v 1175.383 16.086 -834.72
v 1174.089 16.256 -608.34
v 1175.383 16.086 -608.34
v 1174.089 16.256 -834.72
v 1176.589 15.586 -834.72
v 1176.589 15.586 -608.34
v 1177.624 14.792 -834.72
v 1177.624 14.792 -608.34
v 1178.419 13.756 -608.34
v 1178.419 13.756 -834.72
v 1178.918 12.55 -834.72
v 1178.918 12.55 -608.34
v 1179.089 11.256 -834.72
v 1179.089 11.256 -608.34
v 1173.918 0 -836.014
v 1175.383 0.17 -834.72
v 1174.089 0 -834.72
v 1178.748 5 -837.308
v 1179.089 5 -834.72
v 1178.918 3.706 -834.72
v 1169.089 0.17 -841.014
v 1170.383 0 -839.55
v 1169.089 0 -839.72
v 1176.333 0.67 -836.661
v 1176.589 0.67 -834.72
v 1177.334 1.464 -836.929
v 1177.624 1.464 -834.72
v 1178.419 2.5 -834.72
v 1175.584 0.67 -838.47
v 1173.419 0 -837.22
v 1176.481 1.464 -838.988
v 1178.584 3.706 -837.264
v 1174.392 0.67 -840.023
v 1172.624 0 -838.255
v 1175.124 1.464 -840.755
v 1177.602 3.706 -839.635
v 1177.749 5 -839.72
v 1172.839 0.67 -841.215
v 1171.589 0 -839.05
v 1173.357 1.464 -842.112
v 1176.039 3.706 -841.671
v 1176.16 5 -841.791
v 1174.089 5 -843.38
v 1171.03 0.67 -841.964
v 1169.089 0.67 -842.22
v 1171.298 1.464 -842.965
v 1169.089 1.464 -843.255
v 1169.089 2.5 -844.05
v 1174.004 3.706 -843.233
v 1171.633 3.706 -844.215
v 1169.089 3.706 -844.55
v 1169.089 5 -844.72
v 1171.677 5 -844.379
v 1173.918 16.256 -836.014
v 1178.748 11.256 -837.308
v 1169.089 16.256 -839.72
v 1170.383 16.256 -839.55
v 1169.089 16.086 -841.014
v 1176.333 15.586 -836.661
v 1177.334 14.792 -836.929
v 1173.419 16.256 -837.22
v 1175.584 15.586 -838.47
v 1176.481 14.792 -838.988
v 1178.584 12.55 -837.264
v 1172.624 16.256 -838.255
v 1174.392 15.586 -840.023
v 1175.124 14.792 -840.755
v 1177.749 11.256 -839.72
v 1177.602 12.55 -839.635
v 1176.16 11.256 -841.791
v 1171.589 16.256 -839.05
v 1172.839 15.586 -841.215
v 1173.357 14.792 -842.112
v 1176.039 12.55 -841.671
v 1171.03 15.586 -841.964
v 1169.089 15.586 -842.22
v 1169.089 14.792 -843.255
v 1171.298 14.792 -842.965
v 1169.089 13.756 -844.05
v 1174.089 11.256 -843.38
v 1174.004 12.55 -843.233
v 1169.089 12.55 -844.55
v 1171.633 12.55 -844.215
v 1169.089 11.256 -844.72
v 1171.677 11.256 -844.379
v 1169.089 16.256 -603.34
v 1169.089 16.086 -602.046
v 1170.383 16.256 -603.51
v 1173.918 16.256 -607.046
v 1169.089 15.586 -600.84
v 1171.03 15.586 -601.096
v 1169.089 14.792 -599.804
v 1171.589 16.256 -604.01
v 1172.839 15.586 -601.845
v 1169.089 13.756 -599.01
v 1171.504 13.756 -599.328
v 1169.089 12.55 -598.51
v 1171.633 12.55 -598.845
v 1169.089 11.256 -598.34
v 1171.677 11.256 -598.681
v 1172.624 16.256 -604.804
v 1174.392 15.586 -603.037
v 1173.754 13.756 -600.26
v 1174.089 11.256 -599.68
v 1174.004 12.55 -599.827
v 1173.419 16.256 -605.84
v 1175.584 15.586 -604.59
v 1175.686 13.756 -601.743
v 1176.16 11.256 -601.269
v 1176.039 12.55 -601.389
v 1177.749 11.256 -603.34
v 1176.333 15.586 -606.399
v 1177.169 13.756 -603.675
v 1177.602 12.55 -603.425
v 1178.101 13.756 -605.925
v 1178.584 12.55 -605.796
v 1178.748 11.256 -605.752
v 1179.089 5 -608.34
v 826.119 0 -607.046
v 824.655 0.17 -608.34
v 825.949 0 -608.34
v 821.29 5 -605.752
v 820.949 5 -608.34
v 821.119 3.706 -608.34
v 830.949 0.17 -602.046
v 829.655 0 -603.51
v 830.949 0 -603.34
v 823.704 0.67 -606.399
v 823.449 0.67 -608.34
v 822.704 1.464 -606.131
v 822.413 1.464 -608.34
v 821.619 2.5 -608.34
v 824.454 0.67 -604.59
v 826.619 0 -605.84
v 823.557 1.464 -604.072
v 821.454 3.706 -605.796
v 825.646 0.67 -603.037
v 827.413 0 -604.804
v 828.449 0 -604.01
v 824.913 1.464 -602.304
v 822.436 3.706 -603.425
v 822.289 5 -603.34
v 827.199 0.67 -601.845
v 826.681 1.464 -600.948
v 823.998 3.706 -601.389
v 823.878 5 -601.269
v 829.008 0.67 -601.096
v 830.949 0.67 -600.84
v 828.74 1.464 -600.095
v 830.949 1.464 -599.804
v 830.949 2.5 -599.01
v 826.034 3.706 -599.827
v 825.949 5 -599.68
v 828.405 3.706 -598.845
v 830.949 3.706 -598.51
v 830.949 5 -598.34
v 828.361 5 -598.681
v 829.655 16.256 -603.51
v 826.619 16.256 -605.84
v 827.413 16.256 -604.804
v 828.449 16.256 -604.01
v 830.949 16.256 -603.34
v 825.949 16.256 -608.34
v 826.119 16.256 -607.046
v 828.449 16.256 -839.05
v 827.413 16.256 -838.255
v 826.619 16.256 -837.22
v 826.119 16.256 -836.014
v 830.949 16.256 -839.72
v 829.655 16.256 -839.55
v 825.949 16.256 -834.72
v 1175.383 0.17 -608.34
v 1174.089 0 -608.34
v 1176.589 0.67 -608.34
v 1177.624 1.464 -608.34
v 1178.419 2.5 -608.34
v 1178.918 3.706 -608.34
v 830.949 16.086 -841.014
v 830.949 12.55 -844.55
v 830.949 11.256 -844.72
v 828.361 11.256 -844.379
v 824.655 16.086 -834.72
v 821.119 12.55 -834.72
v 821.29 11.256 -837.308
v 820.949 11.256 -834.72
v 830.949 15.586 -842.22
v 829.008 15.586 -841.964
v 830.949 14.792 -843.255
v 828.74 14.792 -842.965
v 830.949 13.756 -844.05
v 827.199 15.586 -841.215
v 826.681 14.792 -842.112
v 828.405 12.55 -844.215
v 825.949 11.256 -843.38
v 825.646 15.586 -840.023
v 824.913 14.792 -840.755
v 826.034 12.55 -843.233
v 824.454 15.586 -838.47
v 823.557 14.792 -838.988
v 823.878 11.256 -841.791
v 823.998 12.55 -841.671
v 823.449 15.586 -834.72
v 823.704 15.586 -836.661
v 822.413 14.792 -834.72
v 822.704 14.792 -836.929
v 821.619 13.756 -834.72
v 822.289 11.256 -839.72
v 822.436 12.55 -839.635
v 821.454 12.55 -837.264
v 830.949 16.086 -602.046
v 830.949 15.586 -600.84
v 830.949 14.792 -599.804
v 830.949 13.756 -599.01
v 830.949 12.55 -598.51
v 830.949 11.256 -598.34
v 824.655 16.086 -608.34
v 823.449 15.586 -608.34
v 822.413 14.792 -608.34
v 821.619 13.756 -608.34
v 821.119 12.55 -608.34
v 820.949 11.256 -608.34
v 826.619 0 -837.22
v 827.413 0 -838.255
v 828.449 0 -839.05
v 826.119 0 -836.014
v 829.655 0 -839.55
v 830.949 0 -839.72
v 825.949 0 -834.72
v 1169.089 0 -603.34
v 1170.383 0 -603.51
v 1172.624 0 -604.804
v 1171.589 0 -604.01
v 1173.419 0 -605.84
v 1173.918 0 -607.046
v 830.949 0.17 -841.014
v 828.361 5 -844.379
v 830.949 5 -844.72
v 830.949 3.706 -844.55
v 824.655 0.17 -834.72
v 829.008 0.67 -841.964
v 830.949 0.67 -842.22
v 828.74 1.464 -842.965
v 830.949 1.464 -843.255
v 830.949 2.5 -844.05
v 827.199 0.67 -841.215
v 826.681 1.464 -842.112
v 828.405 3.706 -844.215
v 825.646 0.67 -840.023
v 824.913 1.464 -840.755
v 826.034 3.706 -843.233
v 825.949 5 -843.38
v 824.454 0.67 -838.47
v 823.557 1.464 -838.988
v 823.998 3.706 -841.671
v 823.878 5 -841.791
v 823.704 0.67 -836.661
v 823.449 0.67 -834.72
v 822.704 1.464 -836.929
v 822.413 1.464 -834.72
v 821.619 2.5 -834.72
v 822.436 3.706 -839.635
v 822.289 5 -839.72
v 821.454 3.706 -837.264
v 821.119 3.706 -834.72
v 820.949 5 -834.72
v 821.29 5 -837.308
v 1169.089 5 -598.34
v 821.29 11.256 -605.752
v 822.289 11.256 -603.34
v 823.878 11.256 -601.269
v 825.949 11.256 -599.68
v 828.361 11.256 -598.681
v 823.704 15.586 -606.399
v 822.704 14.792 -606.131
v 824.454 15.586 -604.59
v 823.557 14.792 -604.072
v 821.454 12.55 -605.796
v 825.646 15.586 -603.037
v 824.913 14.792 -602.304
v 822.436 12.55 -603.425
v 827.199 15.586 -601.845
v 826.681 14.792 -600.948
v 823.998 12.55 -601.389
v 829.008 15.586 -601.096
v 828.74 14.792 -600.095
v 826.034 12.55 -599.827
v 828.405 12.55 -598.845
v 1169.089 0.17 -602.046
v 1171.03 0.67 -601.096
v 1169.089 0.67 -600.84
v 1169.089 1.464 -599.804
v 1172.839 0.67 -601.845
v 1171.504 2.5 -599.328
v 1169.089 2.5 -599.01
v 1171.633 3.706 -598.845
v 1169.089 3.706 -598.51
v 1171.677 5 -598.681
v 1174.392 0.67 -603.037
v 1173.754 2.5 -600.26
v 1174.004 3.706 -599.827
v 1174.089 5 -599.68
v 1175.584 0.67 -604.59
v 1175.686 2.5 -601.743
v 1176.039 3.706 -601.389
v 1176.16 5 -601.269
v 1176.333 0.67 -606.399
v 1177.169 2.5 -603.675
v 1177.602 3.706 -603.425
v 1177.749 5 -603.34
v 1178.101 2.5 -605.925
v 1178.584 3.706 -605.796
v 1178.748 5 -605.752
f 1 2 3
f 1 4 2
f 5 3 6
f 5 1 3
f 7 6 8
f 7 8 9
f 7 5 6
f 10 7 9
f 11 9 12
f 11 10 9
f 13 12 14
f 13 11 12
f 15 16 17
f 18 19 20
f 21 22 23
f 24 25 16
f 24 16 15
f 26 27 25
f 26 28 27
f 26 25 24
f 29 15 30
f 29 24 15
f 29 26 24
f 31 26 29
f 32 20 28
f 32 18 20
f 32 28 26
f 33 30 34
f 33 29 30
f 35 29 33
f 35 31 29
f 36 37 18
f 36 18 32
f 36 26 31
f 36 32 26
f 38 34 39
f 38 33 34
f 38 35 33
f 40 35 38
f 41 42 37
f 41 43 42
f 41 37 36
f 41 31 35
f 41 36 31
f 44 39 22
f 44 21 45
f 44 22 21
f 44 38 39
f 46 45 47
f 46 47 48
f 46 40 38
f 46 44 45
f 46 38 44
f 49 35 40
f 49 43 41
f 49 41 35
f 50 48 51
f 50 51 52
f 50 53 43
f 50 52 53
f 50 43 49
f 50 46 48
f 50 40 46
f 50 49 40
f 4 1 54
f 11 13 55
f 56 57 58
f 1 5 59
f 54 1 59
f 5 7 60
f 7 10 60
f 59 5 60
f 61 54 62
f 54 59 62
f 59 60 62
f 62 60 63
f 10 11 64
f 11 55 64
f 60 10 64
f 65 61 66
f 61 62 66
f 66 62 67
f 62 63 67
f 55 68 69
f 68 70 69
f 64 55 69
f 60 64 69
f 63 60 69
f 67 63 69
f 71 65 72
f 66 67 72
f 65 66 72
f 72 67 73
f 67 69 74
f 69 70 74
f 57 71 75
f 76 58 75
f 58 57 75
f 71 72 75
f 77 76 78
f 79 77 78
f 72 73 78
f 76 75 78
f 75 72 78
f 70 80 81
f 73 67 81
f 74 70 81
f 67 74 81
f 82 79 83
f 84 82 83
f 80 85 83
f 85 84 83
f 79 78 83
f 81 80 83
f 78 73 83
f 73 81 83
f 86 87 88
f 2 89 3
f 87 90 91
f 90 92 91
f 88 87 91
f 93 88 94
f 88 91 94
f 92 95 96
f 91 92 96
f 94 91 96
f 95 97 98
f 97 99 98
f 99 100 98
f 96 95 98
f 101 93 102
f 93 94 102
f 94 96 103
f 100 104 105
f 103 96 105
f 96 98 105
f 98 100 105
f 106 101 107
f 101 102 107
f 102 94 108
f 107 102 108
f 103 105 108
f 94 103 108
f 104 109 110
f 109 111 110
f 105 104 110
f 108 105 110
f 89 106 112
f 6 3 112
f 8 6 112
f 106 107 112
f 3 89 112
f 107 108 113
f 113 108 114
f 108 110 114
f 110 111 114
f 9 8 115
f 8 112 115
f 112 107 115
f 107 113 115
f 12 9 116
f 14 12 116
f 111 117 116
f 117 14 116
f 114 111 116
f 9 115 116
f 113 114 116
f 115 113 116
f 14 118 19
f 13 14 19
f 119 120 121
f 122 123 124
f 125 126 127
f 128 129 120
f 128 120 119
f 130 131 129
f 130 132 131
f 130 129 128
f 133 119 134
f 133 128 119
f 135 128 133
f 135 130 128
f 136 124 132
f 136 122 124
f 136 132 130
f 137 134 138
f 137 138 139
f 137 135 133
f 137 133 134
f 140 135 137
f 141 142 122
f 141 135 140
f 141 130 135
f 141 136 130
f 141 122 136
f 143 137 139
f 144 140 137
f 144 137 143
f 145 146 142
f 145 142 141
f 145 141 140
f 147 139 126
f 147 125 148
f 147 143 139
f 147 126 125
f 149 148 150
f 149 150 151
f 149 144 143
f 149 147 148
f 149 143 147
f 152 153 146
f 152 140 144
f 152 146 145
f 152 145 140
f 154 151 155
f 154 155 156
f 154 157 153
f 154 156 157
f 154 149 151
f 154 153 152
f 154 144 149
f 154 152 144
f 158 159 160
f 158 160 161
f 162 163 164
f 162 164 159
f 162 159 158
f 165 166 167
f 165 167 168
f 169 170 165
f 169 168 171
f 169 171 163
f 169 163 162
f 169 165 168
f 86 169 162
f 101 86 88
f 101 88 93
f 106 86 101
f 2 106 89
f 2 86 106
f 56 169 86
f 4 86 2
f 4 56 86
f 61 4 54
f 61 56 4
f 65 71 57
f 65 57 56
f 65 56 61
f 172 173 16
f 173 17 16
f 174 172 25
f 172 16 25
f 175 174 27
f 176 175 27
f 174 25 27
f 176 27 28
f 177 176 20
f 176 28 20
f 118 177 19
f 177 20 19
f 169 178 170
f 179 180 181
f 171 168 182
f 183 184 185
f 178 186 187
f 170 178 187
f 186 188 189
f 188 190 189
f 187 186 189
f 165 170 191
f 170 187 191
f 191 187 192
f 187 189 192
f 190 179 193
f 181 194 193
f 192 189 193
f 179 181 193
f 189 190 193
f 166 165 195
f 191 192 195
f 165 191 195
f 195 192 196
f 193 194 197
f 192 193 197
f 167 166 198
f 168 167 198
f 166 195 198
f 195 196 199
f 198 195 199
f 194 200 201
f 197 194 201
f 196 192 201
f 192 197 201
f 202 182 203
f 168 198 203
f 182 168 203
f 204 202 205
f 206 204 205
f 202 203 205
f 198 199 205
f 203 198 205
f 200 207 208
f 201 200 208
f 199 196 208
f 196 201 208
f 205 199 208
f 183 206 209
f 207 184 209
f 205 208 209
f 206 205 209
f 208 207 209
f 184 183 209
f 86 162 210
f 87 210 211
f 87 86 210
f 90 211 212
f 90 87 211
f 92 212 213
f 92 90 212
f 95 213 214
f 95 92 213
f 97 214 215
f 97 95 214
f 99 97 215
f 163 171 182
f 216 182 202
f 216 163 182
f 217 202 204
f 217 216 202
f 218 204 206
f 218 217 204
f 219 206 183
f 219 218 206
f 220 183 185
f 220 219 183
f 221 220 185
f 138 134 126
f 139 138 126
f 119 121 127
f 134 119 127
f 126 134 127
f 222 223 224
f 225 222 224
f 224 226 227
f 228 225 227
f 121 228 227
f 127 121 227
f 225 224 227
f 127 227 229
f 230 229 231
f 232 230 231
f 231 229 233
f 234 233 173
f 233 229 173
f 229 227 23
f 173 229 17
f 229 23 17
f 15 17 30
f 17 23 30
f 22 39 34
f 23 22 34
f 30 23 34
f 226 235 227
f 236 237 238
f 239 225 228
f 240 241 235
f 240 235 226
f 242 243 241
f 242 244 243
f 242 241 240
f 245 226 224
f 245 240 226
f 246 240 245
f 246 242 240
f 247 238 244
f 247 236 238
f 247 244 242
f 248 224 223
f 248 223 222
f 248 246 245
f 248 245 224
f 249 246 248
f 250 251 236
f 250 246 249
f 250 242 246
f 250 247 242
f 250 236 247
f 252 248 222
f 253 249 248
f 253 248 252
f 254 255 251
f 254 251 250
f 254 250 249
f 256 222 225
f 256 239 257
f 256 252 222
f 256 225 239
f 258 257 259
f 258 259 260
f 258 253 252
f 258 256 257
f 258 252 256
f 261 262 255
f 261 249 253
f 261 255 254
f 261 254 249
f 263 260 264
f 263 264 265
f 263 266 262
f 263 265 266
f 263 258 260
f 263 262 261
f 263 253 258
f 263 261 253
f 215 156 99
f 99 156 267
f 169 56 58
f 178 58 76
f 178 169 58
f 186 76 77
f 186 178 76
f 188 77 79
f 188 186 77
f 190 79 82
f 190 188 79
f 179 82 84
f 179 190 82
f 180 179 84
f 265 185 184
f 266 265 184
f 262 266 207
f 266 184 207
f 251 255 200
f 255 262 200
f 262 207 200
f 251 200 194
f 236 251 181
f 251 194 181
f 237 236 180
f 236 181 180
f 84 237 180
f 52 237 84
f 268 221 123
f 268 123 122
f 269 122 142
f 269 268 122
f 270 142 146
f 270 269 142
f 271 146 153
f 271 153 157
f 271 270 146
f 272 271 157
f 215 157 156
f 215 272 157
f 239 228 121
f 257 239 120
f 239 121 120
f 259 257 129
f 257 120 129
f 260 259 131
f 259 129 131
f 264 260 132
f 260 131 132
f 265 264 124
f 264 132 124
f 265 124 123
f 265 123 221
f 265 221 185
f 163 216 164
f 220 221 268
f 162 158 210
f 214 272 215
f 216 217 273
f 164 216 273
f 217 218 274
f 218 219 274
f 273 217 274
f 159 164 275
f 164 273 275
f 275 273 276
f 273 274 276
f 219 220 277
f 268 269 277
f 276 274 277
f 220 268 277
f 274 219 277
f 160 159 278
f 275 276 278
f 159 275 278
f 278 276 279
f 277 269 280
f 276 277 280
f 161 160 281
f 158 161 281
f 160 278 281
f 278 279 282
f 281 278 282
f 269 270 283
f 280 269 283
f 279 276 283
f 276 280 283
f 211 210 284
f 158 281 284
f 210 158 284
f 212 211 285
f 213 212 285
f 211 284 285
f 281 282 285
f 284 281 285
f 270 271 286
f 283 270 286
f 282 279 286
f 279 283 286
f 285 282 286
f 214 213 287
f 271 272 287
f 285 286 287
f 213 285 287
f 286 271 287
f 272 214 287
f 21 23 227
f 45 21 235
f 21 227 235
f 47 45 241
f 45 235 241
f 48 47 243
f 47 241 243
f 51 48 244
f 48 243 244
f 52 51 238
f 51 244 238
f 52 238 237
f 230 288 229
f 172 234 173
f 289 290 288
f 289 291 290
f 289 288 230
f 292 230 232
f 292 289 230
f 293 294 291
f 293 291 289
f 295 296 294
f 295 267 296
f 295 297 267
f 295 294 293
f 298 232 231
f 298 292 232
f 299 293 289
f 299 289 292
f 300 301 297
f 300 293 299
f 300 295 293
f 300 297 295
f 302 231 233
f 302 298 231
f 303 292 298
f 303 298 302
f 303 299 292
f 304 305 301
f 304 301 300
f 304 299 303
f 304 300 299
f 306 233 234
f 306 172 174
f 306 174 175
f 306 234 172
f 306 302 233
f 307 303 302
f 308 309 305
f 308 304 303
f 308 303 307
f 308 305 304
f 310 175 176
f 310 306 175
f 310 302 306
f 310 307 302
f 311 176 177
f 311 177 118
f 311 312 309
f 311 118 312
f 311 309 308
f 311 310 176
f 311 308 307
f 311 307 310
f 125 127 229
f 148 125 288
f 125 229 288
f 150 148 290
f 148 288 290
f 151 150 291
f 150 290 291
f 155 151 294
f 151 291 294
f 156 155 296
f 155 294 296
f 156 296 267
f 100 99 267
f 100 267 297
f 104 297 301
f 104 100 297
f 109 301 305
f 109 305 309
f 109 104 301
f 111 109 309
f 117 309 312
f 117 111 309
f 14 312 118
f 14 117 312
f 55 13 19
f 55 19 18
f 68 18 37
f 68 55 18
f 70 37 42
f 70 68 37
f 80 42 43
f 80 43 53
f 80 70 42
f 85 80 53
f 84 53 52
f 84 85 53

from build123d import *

# Parameters (mm, degrees)
SKETCH1_W           = 358.14
SKETCH1_H           = 246.38
BOSS_EXTRUDE1_DEPTH = 16.256
FILLET1_R           = 10
FILLET2_R           = 5
FILLET3_R           = 5


with BuildPart() as part:
    # Sketch1 → Boss-Extrude1 (new body)
    with BuildSketch(Plane(origin=(0, 0, 0), x_dir=(1, 0, 0), z_dir=(0, 1, 0))):
        with Locations((1000.018849058, 721.529961316)):
            Rectangle(SKETCH1_W, SKETCH1_H)
    extrude(amount=BOSS_EXTRUDE1_DEPTH)

    # Fillet1
    fillet1_edges = [part.edges().sort_by_distance(p)[0] for p in [
        (1179.088849058, 8.128, -598.339961316),
        (820.948849058, 8.128, -598.339961316),
        (820.948849058, 8.128, -844.719961316),
        (1179.088849058, 8.128, -844.719961316),
    ]]
    fillet(fillet1_edges, radius=FILLET1_R)

    # Fillet2
    fillet2_edges = [part.edges().sort_by_distance(p)[0] for p in [
        (1179.088849058, 16.256, -721.529961316),
        (1000.018849058, 16.256, -598.339961316),
        (1000.018849058, 16.256, -844.719961316),
        (820.948849058, 16.256, -721.529961316),
        (1176.15991687, 16.256, -841.791029128),
        (823.877781246, 16.256, -841.791029128),
        (823.877781246, 16.256, -601.268893504),
        (1176.15991687, 16.256, -601.268893504),
    ]]
    fillet(fillet2_edges, radius=FILLET2_R)

    # Fillet3
    fillet3_edges = [part.edges().sort_by_distance(p)[0] for p in [
        (1179.088849058, 0, -721.529961316),
        (1000.018849058, 0, -598.339961316),
        (820.948849058, 0, -721.529961316),
        (1000.018849058, 0, -844.719961316),
        (1176.15991687, 0, -841.791029128),
        (823.877781246, 0, -841.791029128),
        (823.877781246, 0, -601.268893504),
        (1176.15991687, 0, -601.268893504),
    ]]
    fillet(fillet3_edges, radius=FILLET3_R)


solid = part.part
